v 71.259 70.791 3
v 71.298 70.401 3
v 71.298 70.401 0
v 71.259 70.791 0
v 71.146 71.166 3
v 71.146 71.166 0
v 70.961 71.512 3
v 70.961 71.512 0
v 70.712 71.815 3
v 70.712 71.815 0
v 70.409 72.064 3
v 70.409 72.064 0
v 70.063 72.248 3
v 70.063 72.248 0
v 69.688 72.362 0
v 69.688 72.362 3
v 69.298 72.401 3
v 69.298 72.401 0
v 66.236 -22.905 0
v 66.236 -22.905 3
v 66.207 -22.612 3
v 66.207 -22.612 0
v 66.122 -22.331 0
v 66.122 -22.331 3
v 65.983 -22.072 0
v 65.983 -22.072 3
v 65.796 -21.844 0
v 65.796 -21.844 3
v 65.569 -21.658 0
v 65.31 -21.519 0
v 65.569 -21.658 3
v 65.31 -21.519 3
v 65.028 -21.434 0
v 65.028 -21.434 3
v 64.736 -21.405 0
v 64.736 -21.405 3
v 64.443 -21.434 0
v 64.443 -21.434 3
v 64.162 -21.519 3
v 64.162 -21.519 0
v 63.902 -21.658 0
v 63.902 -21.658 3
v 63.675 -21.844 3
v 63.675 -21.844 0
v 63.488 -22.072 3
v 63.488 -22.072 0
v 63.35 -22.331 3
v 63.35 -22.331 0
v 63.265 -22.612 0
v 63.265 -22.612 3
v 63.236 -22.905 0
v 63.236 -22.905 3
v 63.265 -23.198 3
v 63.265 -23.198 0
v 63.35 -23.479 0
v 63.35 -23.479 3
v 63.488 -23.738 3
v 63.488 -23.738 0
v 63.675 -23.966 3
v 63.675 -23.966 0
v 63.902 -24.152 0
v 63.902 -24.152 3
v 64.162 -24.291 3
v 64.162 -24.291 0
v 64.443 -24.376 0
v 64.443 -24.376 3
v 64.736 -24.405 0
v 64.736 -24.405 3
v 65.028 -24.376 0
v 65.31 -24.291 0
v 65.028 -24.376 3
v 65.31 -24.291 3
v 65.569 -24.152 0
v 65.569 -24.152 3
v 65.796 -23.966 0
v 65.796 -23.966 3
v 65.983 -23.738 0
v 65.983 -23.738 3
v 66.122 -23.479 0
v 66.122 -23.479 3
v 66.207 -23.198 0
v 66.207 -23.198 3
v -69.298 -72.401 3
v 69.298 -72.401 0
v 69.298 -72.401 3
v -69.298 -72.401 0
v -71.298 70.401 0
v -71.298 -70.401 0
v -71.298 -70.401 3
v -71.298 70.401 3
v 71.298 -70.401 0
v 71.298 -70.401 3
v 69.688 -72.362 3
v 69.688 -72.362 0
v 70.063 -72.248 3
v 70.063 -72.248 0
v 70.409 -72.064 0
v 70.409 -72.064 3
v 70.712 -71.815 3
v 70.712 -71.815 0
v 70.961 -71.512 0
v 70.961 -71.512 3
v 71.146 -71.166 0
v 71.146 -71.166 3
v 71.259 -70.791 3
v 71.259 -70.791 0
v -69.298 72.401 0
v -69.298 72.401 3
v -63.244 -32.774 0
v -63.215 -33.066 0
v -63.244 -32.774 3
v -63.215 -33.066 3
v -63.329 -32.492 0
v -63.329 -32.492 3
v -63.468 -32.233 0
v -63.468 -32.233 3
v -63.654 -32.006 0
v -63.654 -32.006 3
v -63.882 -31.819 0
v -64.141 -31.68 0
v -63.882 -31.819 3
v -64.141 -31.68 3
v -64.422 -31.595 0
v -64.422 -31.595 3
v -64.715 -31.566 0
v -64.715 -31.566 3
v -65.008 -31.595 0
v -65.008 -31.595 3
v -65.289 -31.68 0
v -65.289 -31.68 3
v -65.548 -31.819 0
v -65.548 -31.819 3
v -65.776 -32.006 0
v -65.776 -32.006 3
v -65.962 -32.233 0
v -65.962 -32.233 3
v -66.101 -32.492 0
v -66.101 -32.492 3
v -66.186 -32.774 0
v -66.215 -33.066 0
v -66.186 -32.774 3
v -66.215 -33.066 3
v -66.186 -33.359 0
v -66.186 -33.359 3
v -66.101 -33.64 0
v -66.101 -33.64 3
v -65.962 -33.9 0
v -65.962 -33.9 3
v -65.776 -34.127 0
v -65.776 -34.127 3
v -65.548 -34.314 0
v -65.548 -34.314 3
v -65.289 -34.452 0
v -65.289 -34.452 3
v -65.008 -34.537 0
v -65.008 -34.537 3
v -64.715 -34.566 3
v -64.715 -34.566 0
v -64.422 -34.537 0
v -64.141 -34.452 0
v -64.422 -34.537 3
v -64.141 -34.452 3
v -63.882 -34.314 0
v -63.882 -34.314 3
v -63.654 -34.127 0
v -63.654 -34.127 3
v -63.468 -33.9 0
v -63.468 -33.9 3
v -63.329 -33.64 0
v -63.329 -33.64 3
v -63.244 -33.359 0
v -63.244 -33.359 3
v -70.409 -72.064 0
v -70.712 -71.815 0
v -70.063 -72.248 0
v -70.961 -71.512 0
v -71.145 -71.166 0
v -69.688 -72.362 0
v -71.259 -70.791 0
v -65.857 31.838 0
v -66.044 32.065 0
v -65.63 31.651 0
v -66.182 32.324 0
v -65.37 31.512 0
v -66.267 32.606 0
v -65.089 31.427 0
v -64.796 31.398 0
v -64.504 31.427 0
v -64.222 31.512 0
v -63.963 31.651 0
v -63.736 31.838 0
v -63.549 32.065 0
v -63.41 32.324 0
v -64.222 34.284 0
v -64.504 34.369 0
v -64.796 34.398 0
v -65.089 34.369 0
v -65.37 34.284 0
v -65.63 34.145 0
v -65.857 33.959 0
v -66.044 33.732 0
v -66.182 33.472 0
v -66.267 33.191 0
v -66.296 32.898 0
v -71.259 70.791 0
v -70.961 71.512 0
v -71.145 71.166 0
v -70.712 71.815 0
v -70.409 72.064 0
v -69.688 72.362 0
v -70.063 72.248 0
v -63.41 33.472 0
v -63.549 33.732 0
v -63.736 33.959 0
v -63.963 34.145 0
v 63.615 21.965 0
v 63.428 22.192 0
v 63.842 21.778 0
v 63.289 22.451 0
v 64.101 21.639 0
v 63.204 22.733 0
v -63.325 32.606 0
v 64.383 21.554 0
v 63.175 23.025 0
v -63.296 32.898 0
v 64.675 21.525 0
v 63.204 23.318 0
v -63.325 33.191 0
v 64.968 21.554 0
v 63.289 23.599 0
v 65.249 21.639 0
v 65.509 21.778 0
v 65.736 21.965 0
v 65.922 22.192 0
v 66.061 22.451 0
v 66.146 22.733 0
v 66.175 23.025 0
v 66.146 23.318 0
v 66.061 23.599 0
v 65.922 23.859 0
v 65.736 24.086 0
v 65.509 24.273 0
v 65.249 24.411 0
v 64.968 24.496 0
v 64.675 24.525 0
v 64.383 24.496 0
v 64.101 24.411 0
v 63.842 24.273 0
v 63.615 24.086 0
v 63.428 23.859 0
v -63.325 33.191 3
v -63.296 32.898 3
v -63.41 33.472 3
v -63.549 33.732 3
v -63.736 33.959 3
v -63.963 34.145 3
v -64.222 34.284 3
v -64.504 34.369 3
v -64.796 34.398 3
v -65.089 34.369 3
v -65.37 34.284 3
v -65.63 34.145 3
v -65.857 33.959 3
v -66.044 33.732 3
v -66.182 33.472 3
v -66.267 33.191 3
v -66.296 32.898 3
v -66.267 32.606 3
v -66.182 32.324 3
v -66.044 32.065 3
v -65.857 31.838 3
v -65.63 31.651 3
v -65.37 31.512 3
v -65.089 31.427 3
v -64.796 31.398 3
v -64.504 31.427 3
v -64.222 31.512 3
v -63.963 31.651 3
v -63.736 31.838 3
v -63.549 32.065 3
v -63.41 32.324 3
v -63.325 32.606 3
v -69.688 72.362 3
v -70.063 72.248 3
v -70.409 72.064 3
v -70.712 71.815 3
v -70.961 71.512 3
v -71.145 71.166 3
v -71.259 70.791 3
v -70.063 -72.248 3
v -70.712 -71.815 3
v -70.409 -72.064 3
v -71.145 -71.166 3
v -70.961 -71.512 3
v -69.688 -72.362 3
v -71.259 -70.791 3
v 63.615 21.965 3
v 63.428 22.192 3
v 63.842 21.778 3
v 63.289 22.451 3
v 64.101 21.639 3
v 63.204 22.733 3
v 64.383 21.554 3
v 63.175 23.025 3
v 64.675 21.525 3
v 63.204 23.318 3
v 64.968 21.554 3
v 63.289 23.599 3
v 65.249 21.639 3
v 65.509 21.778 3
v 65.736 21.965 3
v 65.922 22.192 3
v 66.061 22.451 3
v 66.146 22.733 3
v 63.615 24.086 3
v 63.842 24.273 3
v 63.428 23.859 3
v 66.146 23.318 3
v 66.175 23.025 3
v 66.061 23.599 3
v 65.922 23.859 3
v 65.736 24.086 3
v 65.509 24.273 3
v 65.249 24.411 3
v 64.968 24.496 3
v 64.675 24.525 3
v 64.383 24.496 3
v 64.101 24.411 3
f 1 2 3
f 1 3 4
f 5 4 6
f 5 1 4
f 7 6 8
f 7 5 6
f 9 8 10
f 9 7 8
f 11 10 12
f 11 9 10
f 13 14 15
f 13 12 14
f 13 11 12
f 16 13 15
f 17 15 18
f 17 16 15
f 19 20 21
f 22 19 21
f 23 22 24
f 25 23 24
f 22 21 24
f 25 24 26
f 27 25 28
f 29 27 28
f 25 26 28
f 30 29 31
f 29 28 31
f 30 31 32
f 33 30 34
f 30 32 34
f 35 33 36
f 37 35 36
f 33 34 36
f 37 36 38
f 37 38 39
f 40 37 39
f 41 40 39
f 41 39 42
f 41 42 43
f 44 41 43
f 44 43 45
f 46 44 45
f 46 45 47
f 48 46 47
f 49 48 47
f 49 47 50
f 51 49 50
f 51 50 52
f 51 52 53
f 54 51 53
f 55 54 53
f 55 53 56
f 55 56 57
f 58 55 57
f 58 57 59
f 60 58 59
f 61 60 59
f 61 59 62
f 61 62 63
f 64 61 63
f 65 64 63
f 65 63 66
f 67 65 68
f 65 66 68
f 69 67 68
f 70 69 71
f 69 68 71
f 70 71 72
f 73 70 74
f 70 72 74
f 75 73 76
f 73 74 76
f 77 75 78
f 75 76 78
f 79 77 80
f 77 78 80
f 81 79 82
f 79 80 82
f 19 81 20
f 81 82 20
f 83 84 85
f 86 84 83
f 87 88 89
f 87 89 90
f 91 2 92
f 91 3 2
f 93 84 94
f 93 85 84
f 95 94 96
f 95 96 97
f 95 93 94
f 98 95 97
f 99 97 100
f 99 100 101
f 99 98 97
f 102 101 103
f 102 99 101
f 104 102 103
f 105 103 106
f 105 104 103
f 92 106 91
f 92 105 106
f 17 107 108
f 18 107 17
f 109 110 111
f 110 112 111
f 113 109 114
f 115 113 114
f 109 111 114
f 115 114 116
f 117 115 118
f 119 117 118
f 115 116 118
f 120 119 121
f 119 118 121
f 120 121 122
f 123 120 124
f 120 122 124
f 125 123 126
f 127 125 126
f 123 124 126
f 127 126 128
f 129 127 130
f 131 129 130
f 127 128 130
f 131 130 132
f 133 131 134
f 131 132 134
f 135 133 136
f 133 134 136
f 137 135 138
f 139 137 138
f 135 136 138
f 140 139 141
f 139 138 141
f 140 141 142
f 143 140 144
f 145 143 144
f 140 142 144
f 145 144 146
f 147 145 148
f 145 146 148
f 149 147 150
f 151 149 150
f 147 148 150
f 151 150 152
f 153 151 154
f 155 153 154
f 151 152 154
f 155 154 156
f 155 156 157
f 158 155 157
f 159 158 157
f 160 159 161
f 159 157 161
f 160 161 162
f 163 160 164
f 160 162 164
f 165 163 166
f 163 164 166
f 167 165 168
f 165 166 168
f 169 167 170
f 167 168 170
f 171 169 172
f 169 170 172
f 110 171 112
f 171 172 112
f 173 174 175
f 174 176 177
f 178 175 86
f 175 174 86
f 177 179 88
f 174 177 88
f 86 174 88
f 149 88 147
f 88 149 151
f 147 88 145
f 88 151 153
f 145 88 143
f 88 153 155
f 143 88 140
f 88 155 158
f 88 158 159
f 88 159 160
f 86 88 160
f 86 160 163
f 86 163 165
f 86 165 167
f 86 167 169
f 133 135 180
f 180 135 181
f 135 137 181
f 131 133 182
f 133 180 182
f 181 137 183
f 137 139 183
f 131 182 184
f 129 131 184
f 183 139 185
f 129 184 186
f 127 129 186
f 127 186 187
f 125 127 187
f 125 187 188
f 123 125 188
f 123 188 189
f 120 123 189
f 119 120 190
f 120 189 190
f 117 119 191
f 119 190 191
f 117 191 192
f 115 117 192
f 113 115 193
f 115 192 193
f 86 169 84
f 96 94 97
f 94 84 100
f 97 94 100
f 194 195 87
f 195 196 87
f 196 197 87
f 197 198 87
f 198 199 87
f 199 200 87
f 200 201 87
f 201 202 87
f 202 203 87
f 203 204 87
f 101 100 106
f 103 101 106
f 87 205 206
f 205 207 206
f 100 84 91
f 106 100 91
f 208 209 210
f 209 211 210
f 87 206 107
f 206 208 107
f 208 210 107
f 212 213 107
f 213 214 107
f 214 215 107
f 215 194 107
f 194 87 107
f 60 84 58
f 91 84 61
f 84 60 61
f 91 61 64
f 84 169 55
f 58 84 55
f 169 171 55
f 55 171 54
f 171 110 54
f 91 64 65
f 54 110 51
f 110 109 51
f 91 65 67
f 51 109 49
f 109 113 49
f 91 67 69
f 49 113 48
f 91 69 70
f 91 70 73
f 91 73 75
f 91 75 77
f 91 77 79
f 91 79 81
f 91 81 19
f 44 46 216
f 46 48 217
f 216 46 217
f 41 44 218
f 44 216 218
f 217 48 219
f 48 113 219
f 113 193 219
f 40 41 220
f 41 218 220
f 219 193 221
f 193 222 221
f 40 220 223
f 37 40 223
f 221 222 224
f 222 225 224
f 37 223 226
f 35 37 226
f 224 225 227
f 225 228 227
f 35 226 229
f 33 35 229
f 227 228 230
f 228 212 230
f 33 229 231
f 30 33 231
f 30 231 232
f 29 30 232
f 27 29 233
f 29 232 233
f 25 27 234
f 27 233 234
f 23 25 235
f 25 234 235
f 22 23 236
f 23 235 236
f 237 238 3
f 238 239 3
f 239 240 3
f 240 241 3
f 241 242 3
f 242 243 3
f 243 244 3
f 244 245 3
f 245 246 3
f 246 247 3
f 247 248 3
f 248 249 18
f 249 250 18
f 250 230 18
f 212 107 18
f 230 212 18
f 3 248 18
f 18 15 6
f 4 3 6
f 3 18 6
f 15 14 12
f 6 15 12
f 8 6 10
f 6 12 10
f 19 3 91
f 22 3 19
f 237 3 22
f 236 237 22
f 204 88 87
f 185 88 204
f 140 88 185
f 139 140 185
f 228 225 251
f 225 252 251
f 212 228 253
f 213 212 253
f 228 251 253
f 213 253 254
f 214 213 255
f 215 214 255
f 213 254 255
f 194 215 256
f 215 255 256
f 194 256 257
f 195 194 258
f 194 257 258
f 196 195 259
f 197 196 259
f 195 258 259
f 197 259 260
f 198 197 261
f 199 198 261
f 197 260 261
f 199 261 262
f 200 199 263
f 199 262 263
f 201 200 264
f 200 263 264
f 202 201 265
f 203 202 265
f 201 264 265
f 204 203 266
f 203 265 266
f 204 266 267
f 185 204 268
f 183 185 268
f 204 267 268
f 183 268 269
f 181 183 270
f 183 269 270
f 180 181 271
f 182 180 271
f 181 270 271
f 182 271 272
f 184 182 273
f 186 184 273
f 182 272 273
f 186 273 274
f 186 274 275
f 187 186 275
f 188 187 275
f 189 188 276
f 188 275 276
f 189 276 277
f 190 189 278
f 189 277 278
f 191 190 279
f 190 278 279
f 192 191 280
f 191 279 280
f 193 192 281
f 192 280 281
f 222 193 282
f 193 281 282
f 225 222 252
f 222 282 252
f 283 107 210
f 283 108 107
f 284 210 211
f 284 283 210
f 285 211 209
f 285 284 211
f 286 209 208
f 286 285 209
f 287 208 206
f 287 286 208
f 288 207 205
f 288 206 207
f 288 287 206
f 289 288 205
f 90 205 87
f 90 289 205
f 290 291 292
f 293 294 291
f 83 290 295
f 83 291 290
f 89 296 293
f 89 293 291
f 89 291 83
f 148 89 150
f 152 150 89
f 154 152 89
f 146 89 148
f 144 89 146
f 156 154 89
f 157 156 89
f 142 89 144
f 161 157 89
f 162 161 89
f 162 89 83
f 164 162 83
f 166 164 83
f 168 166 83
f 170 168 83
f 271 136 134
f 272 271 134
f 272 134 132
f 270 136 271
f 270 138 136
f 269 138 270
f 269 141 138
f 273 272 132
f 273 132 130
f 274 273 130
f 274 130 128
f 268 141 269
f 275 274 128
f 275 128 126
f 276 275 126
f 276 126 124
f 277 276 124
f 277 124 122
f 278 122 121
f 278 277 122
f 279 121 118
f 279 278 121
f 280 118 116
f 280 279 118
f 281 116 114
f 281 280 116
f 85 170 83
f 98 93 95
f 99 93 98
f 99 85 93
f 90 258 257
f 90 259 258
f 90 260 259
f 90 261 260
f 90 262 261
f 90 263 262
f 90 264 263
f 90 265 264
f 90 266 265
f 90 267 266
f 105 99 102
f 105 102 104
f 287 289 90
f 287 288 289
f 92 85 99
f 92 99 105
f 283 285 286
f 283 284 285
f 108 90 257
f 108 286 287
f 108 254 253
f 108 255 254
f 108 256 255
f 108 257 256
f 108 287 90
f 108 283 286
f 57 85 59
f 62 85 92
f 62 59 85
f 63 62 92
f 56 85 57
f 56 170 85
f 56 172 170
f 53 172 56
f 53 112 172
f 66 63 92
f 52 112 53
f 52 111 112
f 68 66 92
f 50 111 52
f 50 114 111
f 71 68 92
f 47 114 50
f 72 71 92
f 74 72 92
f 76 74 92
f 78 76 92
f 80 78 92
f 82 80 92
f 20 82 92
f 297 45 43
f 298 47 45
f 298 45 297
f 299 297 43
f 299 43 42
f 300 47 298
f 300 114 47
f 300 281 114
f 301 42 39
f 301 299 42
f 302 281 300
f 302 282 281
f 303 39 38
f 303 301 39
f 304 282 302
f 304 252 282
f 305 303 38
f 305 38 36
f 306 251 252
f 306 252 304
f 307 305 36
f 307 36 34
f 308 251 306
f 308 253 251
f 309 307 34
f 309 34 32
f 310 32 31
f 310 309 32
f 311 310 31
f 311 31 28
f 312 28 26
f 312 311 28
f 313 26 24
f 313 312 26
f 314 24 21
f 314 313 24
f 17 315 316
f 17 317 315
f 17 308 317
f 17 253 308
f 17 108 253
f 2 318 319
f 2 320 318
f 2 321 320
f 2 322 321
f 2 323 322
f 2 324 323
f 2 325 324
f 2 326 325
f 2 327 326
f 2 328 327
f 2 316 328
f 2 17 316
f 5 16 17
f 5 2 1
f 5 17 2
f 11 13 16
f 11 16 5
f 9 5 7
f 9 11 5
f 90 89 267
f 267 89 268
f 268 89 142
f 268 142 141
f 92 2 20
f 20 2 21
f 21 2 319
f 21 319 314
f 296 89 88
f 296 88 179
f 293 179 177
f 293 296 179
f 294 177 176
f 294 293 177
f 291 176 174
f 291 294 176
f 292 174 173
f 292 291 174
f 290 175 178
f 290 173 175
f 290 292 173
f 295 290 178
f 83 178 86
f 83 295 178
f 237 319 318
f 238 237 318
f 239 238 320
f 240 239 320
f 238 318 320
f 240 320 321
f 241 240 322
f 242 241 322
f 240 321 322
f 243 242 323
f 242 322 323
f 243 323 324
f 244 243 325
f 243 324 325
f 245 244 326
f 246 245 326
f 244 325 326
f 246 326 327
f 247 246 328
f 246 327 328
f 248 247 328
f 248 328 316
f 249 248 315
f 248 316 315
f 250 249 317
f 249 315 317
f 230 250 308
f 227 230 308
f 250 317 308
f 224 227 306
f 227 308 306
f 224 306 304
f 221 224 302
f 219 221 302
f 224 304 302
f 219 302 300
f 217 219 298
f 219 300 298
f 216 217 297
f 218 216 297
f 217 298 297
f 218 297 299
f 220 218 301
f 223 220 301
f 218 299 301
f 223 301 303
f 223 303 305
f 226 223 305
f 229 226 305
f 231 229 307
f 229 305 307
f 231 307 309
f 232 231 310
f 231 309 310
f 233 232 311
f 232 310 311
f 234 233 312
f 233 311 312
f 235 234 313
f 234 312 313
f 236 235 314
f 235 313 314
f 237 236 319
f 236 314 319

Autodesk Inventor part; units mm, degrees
ref_plane "YZ Plane" through (0, 0, 0) normal (1, 0, 0) x (0, 1, 0)
ref_plane "XZ Plane" through (0, 0, 0) normal (0, 1, 0) x (-1, 0, 0)
ref_plane "XY Plane" through (0, 0, 0) normal (0, 0, 1) x (1, 0, 0)
ref_plane "Work Plane1" through (0, 0, 0) normal (0, 0, 1) x (1, 0, 0)
sketch "Sketch1" plane through (0, 0, 0) normal (0, 0, 1) x (1, 0, 0)
  line L0 (71.2978, -72.4006) -> (-71.2977, -72.4006)
  line L1 (-71.2977, -72.4006) -> (-71.2977, 72.4006)
  line L2 (-71.2977, 72.4006) -> (71.2978, 72.4006)
  line L3 (71.2978, 72.4006) -> (71.2978, -72.4006)
  point P0 (0, 0)
extrude "Extrusion1" add sketch "Sketch1" along normal blind 3
fillet "Fillet1" radius 2 4 edges at (-71.2977, 72.4006, 1.5) (-71.2977, -72.4006, 1.5) (71.2978, -72.4006, 1.5) (71.2978, 72.4006, 1.5)
sketch "Sketch2" plane through (0, 0, 3) normal (0, 0, 1) x (1, 0, 0)
  circle A0 centre (-64.7963, 32.8982) radius 1.5
  circle A1 centre (-64.7151, -33.0663) radius 1.5
  circle A2 centre (64.7357, -22.905) radius 1.5
  circle A3 centre (64.6752, 23.0253) radius 1.5
  point P0 (0, 0)
  dimension "d3" = 3
  dimension "d4" = 3
  dimension "d5" = 3
  dimension "d6" = 3
extrude "Extrusion2" cut sketch "Sketch2" against normal through all
properties part number "Lid" material "Polycarbonate, Clear"
